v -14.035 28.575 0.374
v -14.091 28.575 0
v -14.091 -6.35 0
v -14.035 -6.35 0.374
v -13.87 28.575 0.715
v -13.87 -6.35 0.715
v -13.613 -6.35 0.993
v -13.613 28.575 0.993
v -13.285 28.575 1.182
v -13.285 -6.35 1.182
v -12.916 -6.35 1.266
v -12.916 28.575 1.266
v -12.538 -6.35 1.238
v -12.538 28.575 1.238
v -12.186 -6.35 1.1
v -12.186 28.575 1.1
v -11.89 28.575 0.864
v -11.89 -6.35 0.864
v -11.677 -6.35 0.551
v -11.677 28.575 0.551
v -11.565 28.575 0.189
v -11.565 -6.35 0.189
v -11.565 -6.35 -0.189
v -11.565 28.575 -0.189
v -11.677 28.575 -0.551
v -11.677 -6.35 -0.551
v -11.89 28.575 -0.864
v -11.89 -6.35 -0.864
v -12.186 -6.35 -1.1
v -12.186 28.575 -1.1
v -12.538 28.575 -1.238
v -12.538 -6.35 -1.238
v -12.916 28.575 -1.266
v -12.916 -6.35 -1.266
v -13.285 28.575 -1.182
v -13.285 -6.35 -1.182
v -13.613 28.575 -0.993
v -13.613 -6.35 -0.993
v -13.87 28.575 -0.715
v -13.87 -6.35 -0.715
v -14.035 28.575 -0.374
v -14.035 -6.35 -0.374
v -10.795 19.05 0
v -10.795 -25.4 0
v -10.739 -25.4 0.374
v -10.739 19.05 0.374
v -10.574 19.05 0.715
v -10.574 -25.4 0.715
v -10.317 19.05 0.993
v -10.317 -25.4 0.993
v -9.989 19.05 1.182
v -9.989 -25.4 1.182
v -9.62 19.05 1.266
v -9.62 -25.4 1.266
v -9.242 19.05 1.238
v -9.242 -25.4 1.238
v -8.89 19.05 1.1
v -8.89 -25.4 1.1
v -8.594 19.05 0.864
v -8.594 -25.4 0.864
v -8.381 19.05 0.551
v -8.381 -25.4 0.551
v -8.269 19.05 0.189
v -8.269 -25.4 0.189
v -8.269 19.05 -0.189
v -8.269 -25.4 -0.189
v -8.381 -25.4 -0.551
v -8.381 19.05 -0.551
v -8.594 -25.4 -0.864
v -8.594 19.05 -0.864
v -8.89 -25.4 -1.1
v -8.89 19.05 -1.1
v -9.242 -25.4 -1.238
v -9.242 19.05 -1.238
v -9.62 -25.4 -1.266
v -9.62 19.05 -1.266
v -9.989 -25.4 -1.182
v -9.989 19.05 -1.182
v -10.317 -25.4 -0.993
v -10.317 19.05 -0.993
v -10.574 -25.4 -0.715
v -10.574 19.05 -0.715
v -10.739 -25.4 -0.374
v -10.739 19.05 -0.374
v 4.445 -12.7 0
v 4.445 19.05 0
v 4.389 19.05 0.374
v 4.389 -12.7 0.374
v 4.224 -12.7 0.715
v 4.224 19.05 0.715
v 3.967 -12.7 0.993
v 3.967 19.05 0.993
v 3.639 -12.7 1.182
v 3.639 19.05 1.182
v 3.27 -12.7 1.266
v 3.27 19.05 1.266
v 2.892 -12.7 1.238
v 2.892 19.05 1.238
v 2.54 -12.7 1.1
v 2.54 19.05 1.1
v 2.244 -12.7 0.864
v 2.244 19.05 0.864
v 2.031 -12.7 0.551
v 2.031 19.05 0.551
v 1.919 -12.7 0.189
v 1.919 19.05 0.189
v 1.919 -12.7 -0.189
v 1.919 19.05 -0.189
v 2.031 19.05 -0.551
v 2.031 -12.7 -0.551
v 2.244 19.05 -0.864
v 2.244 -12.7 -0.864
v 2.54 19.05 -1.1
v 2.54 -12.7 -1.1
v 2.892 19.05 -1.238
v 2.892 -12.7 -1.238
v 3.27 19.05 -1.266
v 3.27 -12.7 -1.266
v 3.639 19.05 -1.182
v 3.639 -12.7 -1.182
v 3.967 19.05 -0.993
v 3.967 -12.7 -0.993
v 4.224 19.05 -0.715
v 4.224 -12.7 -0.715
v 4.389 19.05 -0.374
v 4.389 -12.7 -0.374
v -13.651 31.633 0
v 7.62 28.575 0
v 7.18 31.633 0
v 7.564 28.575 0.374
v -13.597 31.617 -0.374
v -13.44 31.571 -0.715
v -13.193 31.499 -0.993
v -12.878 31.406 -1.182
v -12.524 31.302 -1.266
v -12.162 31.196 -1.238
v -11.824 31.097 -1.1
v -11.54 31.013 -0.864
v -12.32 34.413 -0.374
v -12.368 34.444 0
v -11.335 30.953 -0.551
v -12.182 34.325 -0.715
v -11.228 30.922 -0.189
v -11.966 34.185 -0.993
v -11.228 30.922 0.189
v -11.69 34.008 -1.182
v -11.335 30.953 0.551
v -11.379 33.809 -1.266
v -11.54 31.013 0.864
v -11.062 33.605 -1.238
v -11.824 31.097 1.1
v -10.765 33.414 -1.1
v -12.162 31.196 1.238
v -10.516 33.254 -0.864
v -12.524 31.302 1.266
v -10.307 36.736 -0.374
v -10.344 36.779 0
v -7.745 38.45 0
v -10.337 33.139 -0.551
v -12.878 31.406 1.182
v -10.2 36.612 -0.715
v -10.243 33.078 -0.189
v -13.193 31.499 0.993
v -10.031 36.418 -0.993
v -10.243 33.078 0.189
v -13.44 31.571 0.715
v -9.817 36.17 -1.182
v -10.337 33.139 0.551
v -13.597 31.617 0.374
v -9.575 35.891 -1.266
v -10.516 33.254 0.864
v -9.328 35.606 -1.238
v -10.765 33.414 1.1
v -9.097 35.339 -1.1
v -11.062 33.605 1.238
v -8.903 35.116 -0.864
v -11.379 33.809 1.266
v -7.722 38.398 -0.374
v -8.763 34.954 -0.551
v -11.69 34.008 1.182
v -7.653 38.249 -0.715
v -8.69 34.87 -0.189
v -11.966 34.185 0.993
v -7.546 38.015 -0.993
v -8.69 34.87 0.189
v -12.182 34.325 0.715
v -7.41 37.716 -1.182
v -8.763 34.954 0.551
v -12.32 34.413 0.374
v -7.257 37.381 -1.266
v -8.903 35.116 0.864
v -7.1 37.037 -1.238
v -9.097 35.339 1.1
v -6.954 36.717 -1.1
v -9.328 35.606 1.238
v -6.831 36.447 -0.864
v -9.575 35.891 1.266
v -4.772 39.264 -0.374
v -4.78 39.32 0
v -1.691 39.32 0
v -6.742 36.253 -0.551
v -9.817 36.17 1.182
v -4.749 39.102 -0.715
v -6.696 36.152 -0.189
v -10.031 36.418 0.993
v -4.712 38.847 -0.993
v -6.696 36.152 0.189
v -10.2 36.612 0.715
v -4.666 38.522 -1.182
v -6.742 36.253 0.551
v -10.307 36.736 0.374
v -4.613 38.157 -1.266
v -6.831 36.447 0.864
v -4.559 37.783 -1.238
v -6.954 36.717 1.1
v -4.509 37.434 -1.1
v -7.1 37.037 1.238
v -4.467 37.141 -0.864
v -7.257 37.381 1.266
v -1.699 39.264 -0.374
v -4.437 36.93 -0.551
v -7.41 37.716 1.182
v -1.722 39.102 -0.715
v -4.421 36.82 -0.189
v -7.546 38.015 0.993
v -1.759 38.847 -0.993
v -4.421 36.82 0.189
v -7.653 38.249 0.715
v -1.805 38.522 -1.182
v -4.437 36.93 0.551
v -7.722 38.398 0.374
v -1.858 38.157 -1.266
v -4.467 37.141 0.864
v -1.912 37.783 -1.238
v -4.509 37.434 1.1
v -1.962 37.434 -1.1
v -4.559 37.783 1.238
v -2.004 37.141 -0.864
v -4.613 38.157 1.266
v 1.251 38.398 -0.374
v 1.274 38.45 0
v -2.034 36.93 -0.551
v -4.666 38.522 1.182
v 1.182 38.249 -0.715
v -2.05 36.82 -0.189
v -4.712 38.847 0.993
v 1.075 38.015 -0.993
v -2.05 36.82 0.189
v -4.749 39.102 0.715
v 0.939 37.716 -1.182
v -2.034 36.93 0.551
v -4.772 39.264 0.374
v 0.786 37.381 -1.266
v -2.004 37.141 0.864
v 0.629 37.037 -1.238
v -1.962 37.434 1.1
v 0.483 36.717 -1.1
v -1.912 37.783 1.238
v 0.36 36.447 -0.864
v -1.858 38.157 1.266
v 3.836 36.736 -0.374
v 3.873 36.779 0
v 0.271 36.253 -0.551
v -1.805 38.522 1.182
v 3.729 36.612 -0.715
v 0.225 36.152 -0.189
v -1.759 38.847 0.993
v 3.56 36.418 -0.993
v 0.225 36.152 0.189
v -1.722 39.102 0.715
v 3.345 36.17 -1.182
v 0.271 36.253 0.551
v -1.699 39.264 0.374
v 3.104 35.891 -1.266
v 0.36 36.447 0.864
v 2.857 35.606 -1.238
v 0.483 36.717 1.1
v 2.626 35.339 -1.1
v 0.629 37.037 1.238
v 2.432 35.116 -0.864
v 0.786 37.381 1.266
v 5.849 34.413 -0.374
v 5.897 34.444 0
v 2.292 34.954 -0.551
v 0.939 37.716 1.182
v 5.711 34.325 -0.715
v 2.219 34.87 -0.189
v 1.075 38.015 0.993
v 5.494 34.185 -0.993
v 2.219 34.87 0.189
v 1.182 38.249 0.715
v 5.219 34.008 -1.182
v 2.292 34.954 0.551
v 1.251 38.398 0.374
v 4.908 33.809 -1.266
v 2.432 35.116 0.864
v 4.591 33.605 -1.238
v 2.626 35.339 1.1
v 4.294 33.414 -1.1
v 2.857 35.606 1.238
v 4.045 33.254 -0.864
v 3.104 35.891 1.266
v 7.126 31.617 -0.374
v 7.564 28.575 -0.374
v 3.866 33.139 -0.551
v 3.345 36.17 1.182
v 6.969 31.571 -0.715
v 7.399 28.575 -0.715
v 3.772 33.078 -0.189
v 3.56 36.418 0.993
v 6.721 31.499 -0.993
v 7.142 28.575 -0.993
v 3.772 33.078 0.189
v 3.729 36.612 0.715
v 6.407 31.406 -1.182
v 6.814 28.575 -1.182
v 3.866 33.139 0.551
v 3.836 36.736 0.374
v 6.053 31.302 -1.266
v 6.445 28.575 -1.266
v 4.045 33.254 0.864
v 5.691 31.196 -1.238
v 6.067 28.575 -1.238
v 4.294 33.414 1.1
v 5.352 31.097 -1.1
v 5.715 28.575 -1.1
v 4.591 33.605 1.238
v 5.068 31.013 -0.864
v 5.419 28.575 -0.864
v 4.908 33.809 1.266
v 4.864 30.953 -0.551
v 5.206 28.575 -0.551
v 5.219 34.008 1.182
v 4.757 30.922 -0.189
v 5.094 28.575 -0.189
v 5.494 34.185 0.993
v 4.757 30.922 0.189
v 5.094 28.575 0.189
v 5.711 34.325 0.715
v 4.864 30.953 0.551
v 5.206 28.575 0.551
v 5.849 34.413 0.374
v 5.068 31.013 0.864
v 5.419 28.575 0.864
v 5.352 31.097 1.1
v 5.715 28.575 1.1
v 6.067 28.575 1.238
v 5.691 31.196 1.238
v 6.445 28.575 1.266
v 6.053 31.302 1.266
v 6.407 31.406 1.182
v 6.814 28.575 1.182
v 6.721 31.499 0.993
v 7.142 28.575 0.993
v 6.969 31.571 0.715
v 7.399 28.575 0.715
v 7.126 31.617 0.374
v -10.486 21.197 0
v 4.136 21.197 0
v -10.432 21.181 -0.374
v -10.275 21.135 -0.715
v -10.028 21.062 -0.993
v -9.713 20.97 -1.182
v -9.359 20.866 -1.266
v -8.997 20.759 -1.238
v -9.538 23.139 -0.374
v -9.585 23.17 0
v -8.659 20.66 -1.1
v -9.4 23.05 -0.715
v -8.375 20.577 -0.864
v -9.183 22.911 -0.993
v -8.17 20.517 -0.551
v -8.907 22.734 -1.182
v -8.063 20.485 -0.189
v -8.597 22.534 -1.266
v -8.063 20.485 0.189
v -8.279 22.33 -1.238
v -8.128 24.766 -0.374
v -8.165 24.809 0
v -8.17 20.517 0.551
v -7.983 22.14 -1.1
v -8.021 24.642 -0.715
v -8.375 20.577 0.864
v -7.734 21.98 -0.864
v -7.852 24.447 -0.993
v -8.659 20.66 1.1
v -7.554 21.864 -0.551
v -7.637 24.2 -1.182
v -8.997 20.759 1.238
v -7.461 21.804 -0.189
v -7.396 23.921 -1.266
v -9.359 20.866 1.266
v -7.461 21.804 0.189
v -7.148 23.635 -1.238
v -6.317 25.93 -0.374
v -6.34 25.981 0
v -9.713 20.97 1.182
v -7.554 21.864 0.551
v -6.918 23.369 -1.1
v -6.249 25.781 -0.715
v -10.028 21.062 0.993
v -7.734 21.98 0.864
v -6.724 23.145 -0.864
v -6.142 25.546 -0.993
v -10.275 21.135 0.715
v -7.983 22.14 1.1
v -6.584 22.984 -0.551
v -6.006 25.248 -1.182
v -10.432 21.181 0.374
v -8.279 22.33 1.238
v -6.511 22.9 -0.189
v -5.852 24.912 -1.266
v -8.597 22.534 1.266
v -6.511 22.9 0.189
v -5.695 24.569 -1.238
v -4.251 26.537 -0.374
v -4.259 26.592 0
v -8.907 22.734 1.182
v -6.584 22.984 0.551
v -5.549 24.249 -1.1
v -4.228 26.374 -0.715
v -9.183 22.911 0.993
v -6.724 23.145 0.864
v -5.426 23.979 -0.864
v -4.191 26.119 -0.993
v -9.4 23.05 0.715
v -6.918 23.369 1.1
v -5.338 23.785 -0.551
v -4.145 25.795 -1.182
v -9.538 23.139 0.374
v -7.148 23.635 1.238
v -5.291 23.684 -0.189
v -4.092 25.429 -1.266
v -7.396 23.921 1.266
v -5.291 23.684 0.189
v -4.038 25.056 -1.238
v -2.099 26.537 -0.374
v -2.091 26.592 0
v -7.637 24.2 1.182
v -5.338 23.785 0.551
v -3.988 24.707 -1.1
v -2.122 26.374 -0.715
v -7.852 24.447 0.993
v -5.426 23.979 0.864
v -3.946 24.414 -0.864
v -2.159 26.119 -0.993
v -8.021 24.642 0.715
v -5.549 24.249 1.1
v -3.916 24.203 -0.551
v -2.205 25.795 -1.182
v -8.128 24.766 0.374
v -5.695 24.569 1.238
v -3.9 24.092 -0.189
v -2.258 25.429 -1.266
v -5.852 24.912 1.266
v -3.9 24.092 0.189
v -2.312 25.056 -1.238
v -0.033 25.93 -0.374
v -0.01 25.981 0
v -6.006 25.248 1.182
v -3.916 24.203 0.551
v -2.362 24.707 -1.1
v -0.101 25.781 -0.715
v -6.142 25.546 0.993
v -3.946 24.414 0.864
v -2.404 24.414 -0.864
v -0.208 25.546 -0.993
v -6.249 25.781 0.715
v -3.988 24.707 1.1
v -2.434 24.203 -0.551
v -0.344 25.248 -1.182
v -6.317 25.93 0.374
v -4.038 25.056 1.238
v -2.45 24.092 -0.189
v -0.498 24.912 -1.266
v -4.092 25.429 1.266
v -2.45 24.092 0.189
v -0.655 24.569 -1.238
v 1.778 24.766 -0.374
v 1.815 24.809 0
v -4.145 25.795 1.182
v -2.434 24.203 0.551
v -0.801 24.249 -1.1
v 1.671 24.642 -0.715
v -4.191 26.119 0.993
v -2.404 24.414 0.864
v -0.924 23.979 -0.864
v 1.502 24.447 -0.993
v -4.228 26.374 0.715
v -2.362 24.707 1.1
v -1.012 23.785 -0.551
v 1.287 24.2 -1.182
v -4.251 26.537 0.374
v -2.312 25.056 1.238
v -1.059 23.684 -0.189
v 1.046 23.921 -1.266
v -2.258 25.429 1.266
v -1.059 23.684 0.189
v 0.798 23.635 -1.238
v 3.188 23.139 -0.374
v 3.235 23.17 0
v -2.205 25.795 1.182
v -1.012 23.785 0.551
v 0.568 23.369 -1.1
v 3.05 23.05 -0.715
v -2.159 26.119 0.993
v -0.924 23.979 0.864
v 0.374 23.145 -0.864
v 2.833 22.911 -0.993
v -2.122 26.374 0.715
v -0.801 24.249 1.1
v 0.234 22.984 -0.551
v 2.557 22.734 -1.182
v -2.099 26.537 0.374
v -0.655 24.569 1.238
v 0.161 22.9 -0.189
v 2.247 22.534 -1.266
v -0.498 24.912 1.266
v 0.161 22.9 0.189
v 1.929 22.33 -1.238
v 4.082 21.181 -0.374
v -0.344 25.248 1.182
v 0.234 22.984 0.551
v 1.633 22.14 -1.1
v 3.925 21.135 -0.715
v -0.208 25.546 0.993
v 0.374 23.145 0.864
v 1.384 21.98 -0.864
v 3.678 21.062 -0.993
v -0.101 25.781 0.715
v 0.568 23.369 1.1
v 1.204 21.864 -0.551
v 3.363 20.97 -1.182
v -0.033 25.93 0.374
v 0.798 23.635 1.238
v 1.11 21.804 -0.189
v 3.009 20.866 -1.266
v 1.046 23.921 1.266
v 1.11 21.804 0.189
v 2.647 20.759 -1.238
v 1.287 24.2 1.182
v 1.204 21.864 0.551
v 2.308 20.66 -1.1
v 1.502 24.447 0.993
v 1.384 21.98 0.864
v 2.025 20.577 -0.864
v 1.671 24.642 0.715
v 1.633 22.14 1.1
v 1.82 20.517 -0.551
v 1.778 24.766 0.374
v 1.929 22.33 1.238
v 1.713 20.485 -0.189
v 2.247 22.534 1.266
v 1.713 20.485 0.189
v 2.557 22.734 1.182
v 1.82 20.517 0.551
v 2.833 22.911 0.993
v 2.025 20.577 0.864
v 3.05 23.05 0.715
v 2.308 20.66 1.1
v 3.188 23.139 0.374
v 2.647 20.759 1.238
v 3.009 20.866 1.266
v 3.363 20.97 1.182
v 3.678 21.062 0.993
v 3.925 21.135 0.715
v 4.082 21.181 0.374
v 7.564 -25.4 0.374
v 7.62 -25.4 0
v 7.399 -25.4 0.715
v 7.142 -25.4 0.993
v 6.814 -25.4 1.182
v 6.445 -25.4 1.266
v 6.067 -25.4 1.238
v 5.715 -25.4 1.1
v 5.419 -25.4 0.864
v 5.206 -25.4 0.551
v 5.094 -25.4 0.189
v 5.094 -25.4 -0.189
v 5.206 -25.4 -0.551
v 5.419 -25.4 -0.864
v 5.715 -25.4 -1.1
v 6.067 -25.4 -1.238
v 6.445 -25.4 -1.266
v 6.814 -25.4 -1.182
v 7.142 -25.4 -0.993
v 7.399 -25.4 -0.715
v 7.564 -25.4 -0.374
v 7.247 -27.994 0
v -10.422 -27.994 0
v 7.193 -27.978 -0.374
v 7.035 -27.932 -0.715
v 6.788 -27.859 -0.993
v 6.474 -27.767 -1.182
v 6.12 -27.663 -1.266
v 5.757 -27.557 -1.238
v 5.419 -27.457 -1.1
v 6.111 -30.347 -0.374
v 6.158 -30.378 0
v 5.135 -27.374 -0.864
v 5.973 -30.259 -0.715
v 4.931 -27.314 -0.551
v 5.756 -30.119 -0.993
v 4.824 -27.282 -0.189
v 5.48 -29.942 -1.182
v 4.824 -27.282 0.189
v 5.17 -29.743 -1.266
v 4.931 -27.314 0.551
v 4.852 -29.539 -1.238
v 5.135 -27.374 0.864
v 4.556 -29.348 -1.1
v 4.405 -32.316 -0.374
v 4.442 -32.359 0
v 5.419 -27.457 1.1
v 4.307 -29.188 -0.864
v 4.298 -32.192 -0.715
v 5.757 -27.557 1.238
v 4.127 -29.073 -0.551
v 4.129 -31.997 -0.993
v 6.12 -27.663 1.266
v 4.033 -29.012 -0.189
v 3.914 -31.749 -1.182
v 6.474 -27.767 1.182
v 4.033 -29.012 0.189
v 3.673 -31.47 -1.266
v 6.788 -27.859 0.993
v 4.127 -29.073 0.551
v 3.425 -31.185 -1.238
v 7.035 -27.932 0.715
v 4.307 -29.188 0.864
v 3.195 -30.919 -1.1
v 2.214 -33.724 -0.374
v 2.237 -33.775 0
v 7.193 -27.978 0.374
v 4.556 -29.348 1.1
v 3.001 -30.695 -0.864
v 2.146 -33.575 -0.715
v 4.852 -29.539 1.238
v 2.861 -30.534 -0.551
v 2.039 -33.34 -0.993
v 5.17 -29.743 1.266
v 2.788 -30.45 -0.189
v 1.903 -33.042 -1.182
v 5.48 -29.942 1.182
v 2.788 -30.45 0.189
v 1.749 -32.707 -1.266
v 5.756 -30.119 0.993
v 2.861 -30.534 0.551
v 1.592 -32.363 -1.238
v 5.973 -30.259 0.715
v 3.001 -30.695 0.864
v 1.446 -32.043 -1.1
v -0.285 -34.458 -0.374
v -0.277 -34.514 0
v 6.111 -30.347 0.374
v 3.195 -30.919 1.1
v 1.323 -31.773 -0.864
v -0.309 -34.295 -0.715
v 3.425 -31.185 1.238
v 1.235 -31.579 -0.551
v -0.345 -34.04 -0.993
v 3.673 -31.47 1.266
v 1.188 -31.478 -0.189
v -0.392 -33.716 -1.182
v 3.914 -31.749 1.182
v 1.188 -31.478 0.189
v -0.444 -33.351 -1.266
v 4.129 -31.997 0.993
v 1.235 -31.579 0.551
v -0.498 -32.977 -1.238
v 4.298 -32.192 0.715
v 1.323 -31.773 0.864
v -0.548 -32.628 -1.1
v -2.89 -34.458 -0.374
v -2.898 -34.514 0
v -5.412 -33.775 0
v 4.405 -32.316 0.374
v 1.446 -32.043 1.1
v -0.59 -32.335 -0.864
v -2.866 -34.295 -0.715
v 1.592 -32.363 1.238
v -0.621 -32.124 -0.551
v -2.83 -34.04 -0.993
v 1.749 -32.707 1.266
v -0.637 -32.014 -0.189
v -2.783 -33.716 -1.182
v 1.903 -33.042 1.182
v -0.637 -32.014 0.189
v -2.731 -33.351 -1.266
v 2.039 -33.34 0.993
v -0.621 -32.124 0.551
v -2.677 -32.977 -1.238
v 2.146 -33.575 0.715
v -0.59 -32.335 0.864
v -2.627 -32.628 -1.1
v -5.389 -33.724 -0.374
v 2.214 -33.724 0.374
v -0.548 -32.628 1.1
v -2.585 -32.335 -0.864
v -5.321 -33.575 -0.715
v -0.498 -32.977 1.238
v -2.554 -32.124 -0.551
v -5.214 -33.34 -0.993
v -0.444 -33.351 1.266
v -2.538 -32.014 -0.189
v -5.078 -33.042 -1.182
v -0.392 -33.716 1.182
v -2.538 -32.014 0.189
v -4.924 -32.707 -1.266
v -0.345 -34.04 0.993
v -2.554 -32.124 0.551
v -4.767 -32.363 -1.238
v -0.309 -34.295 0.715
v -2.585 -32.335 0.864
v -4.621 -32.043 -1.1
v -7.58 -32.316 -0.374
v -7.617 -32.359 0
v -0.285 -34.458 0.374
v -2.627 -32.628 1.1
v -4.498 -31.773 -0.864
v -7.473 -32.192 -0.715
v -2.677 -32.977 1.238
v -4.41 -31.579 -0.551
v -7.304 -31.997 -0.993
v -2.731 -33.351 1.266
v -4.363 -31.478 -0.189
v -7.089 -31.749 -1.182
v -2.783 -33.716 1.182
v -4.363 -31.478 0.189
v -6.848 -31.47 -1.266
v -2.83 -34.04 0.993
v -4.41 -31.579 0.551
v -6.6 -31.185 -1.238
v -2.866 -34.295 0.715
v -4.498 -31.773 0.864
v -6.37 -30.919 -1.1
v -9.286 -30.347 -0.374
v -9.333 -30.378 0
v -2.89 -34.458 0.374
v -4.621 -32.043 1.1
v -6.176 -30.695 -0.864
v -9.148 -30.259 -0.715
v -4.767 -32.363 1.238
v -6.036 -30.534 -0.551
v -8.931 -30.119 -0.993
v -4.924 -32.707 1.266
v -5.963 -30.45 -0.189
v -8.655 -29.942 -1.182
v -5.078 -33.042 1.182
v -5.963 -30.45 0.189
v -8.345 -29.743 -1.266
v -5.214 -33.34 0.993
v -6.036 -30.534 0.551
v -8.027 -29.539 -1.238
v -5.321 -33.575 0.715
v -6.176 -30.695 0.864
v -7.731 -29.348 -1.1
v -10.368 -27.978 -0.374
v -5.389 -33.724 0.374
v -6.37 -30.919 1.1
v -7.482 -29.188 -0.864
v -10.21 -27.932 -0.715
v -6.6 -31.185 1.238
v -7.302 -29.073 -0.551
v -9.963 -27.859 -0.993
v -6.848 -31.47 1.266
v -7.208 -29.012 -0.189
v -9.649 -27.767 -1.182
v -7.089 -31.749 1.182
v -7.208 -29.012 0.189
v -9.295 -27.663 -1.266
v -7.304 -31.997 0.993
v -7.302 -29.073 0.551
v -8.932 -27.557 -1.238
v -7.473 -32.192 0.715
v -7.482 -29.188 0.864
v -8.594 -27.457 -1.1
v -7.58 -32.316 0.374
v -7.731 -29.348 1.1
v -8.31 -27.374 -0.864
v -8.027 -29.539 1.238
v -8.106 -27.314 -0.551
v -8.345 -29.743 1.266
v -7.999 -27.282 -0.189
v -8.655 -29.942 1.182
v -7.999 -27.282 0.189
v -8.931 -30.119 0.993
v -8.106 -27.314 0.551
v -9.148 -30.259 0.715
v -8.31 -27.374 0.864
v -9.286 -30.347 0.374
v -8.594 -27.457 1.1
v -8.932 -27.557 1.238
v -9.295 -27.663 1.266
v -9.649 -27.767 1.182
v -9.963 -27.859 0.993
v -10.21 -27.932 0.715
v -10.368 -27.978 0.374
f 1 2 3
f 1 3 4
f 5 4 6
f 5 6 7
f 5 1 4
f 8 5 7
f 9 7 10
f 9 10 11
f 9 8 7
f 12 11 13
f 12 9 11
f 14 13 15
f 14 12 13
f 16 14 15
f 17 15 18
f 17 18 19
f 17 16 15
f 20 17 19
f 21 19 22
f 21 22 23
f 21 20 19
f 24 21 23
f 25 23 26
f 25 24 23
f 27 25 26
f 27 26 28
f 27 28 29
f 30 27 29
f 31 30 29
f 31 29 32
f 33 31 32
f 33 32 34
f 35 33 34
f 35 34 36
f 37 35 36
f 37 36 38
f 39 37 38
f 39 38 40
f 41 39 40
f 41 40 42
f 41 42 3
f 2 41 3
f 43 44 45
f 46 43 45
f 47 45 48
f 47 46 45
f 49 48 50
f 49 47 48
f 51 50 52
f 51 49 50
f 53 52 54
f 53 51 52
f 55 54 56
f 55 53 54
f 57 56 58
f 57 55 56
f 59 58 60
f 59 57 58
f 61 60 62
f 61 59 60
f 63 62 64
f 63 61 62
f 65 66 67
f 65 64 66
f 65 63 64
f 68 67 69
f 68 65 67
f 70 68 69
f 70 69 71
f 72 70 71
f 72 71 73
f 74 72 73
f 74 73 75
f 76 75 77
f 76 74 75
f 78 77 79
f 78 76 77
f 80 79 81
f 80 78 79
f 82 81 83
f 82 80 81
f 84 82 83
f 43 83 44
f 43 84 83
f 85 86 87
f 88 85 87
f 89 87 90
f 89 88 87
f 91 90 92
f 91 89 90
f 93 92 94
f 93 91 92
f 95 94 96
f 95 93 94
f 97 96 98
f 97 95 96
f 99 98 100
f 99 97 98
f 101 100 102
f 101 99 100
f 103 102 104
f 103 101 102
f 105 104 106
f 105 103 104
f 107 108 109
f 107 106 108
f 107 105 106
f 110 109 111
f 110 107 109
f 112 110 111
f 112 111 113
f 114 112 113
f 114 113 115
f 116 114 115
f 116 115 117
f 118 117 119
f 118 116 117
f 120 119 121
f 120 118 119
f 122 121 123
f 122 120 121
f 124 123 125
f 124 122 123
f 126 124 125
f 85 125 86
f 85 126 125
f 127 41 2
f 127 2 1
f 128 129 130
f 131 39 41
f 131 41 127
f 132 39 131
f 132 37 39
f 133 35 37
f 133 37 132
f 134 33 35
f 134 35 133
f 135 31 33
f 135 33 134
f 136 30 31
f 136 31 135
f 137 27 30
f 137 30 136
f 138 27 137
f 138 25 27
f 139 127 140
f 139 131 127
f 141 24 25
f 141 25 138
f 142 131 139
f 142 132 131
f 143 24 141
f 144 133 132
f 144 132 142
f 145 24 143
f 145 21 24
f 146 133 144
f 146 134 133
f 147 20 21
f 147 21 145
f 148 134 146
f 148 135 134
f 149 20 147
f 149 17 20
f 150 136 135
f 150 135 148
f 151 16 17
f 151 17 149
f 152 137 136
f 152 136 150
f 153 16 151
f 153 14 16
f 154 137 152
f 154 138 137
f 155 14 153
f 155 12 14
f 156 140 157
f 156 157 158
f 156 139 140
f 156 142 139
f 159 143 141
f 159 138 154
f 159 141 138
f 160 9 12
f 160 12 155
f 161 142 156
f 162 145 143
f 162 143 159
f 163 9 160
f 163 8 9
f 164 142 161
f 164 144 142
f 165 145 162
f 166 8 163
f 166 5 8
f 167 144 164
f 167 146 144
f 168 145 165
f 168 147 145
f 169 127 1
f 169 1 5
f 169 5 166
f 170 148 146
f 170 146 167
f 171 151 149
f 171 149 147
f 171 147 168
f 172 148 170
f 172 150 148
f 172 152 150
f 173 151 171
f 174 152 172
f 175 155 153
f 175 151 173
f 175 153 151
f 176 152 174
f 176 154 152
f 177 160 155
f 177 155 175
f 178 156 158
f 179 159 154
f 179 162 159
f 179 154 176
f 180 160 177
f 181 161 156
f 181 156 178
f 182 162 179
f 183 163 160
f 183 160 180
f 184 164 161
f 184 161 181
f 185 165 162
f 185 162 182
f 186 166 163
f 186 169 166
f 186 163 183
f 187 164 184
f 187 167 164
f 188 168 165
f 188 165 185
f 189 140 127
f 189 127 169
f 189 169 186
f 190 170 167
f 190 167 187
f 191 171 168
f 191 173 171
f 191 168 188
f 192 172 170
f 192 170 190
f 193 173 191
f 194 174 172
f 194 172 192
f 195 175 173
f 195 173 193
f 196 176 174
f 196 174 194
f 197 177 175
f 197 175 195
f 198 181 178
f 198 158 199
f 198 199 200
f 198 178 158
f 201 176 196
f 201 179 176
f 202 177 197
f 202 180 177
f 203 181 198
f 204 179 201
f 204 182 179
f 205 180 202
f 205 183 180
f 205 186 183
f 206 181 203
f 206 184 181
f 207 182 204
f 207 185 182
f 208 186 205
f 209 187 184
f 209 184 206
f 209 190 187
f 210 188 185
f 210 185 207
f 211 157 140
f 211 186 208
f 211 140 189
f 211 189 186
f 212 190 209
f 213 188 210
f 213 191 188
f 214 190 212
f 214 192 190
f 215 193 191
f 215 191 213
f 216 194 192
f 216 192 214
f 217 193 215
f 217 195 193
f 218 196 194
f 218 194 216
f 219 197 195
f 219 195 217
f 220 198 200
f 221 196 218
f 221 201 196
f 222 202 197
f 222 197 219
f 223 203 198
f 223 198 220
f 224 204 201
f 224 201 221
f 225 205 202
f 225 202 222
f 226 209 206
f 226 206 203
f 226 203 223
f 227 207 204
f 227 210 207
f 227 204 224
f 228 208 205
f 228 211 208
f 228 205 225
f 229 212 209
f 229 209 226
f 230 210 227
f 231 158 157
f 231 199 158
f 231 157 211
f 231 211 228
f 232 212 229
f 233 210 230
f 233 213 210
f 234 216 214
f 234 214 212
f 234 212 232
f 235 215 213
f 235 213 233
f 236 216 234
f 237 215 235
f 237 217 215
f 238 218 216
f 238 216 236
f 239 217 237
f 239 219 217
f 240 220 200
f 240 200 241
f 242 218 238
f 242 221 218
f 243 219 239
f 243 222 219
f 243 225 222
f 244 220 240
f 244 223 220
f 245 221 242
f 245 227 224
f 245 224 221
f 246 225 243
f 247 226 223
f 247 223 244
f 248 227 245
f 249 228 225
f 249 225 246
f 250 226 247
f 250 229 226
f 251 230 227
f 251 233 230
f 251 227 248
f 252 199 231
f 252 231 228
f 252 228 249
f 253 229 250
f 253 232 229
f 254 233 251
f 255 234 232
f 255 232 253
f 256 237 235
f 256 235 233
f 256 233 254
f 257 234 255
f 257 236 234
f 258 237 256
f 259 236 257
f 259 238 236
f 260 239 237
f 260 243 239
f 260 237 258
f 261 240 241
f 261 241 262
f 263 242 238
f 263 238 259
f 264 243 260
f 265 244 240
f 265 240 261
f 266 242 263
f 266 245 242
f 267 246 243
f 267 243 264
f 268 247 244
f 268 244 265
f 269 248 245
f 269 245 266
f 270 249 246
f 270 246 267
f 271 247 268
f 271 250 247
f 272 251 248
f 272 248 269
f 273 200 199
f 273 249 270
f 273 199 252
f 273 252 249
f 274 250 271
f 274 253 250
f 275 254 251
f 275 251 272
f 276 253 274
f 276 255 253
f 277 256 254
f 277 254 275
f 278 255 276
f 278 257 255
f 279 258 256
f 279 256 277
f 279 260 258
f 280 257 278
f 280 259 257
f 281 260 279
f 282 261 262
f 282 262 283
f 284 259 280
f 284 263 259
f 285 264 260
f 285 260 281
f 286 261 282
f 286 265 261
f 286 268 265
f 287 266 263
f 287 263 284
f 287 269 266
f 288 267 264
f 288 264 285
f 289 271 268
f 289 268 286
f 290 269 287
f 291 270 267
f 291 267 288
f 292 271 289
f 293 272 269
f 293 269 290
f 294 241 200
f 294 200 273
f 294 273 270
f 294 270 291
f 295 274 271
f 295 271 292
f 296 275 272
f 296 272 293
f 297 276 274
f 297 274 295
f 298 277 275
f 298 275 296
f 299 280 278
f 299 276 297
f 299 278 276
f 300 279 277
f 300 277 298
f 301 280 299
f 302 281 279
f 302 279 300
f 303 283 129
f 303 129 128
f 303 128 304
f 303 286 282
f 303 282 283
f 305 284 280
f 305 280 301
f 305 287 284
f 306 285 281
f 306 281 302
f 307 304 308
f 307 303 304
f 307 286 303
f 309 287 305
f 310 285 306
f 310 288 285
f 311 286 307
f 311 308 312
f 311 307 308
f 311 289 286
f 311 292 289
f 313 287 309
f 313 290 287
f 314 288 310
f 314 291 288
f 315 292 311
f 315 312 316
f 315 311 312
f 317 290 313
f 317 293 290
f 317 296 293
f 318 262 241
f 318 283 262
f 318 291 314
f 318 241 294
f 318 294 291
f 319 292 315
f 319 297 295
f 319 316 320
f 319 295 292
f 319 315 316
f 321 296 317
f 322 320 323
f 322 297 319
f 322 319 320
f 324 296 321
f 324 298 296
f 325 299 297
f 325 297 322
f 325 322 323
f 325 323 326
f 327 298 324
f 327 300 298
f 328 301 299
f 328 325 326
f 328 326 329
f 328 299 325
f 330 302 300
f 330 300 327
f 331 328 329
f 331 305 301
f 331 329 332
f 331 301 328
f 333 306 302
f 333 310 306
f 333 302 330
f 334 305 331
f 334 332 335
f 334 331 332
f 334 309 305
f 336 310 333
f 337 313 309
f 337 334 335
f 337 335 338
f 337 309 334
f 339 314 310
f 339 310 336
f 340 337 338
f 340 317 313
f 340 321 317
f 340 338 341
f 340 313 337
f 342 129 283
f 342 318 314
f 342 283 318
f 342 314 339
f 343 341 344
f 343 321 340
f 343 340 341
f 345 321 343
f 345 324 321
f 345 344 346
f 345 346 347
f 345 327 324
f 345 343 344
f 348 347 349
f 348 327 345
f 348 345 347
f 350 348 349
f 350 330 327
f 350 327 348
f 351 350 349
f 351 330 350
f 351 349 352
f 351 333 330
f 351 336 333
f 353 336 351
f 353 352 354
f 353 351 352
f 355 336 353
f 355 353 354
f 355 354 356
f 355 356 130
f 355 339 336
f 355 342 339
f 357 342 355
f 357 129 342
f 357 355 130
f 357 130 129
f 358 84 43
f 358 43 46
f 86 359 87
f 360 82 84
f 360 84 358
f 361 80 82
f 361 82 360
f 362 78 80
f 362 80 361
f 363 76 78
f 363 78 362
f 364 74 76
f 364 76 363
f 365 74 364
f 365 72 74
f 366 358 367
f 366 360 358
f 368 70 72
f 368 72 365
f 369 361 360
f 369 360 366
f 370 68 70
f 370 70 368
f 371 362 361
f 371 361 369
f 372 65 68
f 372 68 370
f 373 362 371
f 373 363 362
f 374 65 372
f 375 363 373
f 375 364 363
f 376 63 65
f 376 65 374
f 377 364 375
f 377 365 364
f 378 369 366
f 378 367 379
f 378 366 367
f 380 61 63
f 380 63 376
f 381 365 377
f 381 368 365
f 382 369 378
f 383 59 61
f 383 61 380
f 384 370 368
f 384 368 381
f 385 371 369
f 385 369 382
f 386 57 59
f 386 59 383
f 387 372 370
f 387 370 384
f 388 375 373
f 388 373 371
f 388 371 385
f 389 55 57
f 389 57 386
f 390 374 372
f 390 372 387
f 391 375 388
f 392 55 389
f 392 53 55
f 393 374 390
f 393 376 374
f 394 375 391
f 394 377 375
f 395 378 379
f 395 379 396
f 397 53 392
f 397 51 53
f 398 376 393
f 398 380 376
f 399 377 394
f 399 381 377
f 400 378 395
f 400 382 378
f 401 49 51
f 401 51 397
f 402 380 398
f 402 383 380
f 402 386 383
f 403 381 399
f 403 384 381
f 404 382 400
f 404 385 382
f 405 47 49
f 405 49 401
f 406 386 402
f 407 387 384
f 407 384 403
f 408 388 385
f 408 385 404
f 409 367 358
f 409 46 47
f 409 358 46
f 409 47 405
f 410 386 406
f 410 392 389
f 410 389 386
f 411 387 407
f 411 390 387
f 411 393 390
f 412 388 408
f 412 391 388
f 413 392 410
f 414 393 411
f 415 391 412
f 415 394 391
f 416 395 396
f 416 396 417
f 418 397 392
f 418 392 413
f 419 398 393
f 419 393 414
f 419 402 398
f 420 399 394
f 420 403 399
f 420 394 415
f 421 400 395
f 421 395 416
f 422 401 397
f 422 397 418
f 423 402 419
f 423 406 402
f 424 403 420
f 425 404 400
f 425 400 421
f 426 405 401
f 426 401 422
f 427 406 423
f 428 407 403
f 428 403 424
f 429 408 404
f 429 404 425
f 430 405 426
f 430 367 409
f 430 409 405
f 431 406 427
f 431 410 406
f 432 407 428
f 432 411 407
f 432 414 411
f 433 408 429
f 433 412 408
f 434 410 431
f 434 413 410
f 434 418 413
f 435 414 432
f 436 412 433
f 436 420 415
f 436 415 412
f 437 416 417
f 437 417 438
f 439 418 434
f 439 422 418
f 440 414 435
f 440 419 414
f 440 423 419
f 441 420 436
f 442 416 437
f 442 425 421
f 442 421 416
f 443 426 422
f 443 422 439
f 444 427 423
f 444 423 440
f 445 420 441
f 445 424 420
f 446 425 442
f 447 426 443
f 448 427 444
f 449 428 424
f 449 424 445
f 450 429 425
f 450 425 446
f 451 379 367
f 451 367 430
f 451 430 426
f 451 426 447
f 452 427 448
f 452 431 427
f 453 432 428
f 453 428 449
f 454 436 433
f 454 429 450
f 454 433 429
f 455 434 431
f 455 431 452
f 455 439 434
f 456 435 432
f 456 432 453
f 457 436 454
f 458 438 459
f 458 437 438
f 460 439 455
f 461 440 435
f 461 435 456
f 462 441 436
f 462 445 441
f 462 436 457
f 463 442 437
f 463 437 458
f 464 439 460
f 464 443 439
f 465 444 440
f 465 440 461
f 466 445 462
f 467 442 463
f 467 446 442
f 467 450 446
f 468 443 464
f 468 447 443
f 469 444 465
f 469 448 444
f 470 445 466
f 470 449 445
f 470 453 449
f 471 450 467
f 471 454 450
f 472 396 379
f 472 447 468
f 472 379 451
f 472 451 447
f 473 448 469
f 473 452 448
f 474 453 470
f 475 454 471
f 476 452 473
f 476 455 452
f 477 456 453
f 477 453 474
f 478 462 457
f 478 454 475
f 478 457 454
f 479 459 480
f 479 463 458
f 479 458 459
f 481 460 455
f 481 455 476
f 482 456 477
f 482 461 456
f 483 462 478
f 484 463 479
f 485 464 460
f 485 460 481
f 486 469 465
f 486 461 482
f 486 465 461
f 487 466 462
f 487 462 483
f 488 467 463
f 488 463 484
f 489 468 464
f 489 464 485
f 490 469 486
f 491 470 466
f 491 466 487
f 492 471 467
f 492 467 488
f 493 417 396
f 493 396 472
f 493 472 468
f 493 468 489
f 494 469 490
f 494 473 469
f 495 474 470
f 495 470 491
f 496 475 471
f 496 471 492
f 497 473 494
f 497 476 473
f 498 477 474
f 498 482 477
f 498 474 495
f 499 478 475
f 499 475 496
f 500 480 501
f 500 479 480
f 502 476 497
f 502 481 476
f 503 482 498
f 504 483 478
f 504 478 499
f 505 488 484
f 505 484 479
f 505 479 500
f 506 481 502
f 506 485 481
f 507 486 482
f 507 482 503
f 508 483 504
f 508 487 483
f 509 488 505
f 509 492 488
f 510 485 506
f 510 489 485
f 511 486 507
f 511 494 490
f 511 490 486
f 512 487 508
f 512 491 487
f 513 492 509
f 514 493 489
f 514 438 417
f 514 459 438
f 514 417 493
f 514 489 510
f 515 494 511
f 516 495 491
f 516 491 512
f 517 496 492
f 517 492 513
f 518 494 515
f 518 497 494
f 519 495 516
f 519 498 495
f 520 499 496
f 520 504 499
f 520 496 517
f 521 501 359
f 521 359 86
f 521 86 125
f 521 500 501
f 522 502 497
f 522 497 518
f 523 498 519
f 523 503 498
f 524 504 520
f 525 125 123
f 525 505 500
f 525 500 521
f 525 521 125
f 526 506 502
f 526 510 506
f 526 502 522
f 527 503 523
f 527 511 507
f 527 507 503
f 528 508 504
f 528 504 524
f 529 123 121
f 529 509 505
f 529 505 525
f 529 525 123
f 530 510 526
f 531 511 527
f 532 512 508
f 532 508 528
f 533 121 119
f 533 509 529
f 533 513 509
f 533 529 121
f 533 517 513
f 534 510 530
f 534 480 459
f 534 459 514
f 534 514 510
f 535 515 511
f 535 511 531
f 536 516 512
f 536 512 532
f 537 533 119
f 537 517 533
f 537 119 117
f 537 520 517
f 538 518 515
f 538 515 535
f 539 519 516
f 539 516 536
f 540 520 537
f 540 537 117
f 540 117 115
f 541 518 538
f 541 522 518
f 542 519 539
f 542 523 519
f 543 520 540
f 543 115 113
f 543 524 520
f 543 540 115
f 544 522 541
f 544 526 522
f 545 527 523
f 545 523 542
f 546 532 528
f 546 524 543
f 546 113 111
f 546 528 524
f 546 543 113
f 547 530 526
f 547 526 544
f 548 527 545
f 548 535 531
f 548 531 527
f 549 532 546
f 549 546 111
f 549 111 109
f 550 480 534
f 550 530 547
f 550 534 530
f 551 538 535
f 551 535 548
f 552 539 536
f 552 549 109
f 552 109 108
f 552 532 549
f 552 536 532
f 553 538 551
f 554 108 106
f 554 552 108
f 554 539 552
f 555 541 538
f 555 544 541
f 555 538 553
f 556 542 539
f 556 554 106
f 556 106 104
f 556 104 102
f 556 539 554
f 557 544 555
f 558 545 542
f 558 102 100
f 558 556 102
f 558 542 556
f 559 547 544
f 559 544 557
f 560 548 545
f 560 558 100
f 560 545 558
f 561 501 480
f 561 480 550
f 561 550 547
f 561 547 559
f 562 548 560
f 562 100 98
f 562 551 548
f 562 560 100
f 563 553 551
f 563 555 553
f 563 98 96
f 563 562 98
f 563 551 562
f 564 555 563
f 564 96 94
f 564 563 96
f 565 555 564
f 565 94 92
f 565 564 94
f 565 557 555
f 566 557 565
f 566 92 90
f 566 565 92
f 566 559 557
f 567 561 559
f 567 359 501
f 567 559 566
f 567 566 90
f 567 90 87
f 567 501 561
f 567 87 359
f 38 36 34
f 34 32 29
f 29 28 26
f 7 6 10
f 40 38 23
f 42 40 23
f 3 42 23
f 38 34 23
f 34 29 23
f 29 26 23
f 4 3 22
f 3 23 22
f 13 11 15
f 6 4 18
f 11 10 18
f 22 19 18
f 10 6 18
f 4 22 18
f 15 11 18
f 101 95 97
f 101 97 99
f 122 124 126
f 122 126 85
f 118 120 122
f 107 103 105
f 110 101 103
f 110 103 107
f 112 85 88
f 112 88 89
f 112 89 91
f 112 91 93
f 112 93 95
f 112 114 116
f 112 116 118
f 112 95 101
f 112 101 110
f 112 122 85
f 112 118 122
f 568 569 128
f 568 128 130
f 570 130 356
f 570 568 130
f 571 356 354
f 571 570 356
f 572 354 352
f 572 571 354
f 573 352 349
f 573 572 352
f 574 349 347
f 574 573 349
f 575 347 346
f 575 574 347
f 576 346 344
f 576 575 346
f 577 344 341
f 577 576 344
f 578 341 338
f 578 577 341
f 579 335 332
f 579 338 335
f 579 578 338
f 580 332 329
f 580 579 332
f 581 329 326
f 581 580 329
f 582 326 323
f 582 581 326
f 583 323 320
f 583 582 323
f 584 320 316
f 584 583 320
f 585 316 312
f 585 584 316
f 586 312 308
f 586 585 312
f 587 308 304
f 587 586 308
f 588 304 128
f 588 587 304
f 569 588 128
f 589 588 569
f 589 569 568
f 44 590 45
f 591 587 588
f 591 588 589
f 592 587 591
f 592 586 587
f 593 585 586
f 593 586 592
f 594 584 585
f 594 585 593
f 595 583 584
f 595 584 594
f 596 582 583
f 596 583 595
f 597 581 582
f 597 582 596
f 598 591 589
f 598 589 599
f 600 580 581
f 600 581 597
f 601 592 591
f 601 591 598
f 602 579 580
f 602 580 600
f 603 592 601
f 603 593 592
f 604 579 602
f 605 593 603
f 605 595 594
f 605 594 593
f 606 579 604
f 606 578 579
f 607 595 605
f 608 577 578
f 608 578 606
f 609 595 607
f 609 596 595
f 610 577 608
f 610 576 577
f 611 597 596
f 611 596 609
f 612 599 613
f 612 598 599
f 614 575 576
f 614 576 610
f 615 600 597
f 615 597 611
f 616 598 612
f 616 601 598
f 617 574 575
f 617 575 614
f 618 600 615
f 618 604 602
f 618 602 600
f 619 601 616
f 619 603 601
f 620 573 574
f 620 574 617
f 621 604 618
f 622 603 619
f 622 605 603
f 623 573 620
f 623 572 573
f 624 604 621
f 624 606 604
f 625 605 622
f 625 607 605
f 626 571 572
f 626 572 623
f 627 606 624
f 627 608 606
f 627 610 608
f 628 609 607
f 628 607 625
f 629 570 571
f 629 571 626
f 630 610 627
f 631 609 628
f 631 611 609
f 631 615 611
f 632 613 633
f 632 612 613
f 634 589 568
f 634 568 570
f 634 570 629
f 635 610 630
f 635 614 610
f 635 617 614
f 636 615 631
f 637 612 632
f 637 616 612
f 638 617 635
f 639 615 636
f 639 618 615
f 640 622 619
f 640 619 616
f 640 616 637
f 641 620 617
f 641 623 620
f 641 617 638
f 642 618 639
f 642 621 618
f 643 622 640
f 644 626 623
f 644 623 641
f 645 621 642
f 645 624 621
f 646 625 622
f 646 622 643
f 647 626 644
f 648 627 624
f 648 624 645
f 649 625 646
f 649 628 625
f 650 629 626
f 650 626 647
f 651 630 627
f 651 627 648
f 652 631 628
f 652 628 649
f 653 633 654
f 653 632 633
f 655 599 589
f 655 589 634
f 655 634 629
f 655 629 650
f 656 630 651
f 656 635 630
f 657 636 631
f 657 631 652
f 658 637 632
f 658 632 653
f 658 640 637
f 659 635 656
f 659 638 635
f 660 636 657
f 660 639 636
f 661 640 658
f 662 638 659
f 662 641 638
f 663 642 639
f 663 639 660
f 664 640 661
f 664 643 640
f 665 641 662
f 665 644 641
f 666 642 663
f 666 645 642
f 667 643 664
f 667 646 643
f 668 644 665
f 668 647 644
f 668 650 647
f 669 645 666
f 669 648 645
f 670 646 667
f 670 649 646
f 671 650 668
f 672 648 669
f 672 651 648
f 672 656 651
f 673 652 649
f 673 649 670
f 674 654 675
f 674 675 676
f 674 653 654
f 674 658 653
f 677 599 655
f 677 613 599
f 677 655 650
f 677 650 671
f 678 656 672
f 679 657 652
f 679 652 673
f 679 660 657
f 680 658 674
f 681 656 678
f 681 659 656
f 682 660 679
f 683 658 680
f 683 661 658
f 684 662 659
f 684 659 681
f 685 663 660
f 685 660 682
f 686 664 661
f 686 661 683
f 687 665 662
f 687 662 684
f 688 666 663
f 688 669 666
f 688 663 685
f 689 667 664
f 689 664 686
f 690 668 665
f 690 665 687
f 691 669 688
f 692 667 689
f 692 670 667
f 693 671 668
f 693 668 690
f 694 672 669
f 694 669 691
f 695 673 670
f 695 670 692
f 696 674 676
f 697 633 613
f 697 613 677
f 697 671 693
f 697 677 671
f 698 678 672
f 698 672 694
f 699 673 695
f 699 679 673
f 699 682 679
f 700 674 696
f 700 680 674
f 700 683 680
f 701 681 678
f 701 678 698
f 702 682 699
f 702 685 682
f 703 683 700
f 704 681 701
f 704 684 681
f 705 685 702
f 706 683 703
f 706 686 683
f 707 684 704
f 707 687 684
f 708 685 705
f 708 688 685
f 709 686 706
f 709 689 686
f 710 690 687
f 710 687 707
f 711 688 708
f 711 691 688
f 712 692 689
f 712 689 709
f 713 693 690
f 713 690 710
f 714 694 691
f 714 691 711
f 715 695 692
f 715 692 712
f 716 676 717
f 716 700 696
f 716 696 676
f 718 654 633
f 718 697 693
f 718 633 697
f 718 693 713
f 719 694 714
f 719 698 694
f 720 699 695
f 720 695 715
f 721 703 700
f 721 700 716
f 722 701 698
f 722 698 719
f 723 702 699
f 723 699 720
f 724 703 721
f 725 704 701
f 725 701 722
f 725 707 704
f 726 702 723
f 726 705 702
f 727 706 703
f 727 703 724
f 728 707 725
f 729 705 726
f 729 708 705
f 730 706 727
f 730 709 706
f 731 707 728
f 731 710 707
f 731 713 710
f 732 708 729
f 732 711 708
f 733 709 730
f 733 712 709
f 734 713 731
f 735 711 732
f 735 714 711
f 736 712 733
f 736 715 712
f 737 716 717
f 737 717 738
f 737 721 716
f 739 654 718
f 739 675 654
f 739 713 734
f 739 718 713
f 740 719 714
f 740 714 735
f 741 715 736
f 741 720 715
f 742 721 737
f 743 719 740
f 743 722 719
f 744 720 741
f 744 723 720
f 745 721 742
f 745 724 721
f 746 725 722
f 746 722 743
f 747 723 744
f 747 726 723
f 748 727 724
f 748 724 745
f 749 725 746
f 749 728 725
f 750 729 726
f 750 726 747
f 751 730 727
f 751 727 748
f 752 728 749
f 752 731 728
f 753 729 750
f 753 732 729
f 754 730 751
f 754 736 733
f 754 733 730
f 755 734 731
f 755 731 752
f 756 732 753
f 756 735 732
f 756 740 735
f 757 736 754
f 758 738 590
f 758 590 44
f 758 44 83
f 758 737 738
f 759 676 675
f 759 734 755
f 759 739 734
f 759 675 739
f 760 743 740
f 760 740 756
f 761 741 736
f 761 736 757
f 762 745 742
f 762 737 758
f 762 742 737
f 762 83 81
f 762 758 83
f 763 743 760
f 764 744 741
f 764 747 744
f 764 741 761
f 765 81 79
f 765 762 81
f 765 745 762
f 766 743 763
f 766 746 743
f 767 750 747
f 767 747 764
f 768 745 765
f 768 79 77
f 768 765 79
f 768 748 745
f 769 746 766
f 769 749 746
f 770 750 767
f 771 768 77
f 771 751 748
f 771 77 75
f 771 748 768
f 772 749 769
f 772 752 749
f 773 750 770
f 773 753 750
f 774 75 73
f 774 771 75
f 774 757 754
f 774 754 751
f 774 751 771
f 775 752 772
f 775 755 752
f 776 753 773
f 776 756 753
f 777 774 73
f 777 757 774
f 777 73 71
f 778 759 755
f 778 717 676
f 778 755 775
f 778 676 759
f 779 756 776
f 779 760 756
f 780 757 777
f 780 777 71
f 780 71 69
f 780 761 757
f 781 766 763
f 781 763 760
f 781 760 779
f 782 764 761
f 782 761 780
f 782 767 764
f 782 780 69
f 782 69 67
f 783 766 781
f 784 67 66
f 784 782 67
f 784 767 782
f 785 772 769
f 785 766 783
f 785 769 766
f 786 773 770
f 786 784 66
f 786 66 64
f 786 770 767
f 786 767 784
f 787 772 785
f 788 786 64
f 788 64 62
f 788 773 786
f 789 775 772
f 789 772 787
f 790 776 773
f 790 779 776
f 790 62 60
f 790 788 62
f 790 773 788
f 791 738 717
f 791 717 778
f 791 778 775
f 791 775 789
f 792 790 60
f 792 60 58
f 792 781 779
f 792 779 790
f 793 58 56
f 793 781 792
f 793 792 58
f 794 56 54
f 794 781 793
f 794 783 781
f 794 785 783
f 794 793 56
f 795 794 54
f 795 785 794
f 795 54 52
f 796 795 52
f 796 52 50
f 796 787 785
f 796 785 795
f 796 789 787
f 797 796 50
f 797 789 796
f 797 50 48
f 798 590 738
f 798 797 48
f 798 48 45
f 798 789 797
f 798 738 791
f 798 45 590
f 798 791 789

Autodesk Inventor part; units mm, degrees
ref_plane "YZ Plane" through (0, 0, 0) normal (1, 0, 0) x (0, 1, 0)
ref_plane "XZ Plane" through (0, 0, 0) normal (0, 1, 0) x (-1, 0, 0)
sketch "Sketch1" plane through (0, 0, 0) normal (0, 0, 1) x (1, 0, 0)
  line L0 (-12.8211, -6.35) -> (-12.8211, 28.575)
  arc A0 (6.35, 28.575) -> (-12.8211, 28.575) centre (-3.2355, 28.575) ccw
  line L1 (6.35, 28.575) -> (6.35, -25.4)
  arc A1 (-9.525, -25.4) -> (6.35, -25.4) centre (-1.5875, -25.4) ccw
  line L2 (-9.525, -25.4) -> (-9.525, 19.05)
  arc A2 (3.175, 19.05) -> (-9.525, 19.05) centre (-3.175, 19.05) ccw
  line L3 (3.175, 19.05) -> (3.175, -12.7)
ref_plane "Work Plane1" through (-12.8211, -6.35, 0) normal (0, 1, 0) x (-1, 0, 0)
sketch "Sketch2" plane through (-12.8211, -6.35, 0) normal (0, 1, 0) x (-1, 0, 0)
  circle A0 centre (0, 0) radius 1.27
sweep "Sweep1" add profiles "Sketch2" path "Sketch1"
properties part number "Paper Clip"
